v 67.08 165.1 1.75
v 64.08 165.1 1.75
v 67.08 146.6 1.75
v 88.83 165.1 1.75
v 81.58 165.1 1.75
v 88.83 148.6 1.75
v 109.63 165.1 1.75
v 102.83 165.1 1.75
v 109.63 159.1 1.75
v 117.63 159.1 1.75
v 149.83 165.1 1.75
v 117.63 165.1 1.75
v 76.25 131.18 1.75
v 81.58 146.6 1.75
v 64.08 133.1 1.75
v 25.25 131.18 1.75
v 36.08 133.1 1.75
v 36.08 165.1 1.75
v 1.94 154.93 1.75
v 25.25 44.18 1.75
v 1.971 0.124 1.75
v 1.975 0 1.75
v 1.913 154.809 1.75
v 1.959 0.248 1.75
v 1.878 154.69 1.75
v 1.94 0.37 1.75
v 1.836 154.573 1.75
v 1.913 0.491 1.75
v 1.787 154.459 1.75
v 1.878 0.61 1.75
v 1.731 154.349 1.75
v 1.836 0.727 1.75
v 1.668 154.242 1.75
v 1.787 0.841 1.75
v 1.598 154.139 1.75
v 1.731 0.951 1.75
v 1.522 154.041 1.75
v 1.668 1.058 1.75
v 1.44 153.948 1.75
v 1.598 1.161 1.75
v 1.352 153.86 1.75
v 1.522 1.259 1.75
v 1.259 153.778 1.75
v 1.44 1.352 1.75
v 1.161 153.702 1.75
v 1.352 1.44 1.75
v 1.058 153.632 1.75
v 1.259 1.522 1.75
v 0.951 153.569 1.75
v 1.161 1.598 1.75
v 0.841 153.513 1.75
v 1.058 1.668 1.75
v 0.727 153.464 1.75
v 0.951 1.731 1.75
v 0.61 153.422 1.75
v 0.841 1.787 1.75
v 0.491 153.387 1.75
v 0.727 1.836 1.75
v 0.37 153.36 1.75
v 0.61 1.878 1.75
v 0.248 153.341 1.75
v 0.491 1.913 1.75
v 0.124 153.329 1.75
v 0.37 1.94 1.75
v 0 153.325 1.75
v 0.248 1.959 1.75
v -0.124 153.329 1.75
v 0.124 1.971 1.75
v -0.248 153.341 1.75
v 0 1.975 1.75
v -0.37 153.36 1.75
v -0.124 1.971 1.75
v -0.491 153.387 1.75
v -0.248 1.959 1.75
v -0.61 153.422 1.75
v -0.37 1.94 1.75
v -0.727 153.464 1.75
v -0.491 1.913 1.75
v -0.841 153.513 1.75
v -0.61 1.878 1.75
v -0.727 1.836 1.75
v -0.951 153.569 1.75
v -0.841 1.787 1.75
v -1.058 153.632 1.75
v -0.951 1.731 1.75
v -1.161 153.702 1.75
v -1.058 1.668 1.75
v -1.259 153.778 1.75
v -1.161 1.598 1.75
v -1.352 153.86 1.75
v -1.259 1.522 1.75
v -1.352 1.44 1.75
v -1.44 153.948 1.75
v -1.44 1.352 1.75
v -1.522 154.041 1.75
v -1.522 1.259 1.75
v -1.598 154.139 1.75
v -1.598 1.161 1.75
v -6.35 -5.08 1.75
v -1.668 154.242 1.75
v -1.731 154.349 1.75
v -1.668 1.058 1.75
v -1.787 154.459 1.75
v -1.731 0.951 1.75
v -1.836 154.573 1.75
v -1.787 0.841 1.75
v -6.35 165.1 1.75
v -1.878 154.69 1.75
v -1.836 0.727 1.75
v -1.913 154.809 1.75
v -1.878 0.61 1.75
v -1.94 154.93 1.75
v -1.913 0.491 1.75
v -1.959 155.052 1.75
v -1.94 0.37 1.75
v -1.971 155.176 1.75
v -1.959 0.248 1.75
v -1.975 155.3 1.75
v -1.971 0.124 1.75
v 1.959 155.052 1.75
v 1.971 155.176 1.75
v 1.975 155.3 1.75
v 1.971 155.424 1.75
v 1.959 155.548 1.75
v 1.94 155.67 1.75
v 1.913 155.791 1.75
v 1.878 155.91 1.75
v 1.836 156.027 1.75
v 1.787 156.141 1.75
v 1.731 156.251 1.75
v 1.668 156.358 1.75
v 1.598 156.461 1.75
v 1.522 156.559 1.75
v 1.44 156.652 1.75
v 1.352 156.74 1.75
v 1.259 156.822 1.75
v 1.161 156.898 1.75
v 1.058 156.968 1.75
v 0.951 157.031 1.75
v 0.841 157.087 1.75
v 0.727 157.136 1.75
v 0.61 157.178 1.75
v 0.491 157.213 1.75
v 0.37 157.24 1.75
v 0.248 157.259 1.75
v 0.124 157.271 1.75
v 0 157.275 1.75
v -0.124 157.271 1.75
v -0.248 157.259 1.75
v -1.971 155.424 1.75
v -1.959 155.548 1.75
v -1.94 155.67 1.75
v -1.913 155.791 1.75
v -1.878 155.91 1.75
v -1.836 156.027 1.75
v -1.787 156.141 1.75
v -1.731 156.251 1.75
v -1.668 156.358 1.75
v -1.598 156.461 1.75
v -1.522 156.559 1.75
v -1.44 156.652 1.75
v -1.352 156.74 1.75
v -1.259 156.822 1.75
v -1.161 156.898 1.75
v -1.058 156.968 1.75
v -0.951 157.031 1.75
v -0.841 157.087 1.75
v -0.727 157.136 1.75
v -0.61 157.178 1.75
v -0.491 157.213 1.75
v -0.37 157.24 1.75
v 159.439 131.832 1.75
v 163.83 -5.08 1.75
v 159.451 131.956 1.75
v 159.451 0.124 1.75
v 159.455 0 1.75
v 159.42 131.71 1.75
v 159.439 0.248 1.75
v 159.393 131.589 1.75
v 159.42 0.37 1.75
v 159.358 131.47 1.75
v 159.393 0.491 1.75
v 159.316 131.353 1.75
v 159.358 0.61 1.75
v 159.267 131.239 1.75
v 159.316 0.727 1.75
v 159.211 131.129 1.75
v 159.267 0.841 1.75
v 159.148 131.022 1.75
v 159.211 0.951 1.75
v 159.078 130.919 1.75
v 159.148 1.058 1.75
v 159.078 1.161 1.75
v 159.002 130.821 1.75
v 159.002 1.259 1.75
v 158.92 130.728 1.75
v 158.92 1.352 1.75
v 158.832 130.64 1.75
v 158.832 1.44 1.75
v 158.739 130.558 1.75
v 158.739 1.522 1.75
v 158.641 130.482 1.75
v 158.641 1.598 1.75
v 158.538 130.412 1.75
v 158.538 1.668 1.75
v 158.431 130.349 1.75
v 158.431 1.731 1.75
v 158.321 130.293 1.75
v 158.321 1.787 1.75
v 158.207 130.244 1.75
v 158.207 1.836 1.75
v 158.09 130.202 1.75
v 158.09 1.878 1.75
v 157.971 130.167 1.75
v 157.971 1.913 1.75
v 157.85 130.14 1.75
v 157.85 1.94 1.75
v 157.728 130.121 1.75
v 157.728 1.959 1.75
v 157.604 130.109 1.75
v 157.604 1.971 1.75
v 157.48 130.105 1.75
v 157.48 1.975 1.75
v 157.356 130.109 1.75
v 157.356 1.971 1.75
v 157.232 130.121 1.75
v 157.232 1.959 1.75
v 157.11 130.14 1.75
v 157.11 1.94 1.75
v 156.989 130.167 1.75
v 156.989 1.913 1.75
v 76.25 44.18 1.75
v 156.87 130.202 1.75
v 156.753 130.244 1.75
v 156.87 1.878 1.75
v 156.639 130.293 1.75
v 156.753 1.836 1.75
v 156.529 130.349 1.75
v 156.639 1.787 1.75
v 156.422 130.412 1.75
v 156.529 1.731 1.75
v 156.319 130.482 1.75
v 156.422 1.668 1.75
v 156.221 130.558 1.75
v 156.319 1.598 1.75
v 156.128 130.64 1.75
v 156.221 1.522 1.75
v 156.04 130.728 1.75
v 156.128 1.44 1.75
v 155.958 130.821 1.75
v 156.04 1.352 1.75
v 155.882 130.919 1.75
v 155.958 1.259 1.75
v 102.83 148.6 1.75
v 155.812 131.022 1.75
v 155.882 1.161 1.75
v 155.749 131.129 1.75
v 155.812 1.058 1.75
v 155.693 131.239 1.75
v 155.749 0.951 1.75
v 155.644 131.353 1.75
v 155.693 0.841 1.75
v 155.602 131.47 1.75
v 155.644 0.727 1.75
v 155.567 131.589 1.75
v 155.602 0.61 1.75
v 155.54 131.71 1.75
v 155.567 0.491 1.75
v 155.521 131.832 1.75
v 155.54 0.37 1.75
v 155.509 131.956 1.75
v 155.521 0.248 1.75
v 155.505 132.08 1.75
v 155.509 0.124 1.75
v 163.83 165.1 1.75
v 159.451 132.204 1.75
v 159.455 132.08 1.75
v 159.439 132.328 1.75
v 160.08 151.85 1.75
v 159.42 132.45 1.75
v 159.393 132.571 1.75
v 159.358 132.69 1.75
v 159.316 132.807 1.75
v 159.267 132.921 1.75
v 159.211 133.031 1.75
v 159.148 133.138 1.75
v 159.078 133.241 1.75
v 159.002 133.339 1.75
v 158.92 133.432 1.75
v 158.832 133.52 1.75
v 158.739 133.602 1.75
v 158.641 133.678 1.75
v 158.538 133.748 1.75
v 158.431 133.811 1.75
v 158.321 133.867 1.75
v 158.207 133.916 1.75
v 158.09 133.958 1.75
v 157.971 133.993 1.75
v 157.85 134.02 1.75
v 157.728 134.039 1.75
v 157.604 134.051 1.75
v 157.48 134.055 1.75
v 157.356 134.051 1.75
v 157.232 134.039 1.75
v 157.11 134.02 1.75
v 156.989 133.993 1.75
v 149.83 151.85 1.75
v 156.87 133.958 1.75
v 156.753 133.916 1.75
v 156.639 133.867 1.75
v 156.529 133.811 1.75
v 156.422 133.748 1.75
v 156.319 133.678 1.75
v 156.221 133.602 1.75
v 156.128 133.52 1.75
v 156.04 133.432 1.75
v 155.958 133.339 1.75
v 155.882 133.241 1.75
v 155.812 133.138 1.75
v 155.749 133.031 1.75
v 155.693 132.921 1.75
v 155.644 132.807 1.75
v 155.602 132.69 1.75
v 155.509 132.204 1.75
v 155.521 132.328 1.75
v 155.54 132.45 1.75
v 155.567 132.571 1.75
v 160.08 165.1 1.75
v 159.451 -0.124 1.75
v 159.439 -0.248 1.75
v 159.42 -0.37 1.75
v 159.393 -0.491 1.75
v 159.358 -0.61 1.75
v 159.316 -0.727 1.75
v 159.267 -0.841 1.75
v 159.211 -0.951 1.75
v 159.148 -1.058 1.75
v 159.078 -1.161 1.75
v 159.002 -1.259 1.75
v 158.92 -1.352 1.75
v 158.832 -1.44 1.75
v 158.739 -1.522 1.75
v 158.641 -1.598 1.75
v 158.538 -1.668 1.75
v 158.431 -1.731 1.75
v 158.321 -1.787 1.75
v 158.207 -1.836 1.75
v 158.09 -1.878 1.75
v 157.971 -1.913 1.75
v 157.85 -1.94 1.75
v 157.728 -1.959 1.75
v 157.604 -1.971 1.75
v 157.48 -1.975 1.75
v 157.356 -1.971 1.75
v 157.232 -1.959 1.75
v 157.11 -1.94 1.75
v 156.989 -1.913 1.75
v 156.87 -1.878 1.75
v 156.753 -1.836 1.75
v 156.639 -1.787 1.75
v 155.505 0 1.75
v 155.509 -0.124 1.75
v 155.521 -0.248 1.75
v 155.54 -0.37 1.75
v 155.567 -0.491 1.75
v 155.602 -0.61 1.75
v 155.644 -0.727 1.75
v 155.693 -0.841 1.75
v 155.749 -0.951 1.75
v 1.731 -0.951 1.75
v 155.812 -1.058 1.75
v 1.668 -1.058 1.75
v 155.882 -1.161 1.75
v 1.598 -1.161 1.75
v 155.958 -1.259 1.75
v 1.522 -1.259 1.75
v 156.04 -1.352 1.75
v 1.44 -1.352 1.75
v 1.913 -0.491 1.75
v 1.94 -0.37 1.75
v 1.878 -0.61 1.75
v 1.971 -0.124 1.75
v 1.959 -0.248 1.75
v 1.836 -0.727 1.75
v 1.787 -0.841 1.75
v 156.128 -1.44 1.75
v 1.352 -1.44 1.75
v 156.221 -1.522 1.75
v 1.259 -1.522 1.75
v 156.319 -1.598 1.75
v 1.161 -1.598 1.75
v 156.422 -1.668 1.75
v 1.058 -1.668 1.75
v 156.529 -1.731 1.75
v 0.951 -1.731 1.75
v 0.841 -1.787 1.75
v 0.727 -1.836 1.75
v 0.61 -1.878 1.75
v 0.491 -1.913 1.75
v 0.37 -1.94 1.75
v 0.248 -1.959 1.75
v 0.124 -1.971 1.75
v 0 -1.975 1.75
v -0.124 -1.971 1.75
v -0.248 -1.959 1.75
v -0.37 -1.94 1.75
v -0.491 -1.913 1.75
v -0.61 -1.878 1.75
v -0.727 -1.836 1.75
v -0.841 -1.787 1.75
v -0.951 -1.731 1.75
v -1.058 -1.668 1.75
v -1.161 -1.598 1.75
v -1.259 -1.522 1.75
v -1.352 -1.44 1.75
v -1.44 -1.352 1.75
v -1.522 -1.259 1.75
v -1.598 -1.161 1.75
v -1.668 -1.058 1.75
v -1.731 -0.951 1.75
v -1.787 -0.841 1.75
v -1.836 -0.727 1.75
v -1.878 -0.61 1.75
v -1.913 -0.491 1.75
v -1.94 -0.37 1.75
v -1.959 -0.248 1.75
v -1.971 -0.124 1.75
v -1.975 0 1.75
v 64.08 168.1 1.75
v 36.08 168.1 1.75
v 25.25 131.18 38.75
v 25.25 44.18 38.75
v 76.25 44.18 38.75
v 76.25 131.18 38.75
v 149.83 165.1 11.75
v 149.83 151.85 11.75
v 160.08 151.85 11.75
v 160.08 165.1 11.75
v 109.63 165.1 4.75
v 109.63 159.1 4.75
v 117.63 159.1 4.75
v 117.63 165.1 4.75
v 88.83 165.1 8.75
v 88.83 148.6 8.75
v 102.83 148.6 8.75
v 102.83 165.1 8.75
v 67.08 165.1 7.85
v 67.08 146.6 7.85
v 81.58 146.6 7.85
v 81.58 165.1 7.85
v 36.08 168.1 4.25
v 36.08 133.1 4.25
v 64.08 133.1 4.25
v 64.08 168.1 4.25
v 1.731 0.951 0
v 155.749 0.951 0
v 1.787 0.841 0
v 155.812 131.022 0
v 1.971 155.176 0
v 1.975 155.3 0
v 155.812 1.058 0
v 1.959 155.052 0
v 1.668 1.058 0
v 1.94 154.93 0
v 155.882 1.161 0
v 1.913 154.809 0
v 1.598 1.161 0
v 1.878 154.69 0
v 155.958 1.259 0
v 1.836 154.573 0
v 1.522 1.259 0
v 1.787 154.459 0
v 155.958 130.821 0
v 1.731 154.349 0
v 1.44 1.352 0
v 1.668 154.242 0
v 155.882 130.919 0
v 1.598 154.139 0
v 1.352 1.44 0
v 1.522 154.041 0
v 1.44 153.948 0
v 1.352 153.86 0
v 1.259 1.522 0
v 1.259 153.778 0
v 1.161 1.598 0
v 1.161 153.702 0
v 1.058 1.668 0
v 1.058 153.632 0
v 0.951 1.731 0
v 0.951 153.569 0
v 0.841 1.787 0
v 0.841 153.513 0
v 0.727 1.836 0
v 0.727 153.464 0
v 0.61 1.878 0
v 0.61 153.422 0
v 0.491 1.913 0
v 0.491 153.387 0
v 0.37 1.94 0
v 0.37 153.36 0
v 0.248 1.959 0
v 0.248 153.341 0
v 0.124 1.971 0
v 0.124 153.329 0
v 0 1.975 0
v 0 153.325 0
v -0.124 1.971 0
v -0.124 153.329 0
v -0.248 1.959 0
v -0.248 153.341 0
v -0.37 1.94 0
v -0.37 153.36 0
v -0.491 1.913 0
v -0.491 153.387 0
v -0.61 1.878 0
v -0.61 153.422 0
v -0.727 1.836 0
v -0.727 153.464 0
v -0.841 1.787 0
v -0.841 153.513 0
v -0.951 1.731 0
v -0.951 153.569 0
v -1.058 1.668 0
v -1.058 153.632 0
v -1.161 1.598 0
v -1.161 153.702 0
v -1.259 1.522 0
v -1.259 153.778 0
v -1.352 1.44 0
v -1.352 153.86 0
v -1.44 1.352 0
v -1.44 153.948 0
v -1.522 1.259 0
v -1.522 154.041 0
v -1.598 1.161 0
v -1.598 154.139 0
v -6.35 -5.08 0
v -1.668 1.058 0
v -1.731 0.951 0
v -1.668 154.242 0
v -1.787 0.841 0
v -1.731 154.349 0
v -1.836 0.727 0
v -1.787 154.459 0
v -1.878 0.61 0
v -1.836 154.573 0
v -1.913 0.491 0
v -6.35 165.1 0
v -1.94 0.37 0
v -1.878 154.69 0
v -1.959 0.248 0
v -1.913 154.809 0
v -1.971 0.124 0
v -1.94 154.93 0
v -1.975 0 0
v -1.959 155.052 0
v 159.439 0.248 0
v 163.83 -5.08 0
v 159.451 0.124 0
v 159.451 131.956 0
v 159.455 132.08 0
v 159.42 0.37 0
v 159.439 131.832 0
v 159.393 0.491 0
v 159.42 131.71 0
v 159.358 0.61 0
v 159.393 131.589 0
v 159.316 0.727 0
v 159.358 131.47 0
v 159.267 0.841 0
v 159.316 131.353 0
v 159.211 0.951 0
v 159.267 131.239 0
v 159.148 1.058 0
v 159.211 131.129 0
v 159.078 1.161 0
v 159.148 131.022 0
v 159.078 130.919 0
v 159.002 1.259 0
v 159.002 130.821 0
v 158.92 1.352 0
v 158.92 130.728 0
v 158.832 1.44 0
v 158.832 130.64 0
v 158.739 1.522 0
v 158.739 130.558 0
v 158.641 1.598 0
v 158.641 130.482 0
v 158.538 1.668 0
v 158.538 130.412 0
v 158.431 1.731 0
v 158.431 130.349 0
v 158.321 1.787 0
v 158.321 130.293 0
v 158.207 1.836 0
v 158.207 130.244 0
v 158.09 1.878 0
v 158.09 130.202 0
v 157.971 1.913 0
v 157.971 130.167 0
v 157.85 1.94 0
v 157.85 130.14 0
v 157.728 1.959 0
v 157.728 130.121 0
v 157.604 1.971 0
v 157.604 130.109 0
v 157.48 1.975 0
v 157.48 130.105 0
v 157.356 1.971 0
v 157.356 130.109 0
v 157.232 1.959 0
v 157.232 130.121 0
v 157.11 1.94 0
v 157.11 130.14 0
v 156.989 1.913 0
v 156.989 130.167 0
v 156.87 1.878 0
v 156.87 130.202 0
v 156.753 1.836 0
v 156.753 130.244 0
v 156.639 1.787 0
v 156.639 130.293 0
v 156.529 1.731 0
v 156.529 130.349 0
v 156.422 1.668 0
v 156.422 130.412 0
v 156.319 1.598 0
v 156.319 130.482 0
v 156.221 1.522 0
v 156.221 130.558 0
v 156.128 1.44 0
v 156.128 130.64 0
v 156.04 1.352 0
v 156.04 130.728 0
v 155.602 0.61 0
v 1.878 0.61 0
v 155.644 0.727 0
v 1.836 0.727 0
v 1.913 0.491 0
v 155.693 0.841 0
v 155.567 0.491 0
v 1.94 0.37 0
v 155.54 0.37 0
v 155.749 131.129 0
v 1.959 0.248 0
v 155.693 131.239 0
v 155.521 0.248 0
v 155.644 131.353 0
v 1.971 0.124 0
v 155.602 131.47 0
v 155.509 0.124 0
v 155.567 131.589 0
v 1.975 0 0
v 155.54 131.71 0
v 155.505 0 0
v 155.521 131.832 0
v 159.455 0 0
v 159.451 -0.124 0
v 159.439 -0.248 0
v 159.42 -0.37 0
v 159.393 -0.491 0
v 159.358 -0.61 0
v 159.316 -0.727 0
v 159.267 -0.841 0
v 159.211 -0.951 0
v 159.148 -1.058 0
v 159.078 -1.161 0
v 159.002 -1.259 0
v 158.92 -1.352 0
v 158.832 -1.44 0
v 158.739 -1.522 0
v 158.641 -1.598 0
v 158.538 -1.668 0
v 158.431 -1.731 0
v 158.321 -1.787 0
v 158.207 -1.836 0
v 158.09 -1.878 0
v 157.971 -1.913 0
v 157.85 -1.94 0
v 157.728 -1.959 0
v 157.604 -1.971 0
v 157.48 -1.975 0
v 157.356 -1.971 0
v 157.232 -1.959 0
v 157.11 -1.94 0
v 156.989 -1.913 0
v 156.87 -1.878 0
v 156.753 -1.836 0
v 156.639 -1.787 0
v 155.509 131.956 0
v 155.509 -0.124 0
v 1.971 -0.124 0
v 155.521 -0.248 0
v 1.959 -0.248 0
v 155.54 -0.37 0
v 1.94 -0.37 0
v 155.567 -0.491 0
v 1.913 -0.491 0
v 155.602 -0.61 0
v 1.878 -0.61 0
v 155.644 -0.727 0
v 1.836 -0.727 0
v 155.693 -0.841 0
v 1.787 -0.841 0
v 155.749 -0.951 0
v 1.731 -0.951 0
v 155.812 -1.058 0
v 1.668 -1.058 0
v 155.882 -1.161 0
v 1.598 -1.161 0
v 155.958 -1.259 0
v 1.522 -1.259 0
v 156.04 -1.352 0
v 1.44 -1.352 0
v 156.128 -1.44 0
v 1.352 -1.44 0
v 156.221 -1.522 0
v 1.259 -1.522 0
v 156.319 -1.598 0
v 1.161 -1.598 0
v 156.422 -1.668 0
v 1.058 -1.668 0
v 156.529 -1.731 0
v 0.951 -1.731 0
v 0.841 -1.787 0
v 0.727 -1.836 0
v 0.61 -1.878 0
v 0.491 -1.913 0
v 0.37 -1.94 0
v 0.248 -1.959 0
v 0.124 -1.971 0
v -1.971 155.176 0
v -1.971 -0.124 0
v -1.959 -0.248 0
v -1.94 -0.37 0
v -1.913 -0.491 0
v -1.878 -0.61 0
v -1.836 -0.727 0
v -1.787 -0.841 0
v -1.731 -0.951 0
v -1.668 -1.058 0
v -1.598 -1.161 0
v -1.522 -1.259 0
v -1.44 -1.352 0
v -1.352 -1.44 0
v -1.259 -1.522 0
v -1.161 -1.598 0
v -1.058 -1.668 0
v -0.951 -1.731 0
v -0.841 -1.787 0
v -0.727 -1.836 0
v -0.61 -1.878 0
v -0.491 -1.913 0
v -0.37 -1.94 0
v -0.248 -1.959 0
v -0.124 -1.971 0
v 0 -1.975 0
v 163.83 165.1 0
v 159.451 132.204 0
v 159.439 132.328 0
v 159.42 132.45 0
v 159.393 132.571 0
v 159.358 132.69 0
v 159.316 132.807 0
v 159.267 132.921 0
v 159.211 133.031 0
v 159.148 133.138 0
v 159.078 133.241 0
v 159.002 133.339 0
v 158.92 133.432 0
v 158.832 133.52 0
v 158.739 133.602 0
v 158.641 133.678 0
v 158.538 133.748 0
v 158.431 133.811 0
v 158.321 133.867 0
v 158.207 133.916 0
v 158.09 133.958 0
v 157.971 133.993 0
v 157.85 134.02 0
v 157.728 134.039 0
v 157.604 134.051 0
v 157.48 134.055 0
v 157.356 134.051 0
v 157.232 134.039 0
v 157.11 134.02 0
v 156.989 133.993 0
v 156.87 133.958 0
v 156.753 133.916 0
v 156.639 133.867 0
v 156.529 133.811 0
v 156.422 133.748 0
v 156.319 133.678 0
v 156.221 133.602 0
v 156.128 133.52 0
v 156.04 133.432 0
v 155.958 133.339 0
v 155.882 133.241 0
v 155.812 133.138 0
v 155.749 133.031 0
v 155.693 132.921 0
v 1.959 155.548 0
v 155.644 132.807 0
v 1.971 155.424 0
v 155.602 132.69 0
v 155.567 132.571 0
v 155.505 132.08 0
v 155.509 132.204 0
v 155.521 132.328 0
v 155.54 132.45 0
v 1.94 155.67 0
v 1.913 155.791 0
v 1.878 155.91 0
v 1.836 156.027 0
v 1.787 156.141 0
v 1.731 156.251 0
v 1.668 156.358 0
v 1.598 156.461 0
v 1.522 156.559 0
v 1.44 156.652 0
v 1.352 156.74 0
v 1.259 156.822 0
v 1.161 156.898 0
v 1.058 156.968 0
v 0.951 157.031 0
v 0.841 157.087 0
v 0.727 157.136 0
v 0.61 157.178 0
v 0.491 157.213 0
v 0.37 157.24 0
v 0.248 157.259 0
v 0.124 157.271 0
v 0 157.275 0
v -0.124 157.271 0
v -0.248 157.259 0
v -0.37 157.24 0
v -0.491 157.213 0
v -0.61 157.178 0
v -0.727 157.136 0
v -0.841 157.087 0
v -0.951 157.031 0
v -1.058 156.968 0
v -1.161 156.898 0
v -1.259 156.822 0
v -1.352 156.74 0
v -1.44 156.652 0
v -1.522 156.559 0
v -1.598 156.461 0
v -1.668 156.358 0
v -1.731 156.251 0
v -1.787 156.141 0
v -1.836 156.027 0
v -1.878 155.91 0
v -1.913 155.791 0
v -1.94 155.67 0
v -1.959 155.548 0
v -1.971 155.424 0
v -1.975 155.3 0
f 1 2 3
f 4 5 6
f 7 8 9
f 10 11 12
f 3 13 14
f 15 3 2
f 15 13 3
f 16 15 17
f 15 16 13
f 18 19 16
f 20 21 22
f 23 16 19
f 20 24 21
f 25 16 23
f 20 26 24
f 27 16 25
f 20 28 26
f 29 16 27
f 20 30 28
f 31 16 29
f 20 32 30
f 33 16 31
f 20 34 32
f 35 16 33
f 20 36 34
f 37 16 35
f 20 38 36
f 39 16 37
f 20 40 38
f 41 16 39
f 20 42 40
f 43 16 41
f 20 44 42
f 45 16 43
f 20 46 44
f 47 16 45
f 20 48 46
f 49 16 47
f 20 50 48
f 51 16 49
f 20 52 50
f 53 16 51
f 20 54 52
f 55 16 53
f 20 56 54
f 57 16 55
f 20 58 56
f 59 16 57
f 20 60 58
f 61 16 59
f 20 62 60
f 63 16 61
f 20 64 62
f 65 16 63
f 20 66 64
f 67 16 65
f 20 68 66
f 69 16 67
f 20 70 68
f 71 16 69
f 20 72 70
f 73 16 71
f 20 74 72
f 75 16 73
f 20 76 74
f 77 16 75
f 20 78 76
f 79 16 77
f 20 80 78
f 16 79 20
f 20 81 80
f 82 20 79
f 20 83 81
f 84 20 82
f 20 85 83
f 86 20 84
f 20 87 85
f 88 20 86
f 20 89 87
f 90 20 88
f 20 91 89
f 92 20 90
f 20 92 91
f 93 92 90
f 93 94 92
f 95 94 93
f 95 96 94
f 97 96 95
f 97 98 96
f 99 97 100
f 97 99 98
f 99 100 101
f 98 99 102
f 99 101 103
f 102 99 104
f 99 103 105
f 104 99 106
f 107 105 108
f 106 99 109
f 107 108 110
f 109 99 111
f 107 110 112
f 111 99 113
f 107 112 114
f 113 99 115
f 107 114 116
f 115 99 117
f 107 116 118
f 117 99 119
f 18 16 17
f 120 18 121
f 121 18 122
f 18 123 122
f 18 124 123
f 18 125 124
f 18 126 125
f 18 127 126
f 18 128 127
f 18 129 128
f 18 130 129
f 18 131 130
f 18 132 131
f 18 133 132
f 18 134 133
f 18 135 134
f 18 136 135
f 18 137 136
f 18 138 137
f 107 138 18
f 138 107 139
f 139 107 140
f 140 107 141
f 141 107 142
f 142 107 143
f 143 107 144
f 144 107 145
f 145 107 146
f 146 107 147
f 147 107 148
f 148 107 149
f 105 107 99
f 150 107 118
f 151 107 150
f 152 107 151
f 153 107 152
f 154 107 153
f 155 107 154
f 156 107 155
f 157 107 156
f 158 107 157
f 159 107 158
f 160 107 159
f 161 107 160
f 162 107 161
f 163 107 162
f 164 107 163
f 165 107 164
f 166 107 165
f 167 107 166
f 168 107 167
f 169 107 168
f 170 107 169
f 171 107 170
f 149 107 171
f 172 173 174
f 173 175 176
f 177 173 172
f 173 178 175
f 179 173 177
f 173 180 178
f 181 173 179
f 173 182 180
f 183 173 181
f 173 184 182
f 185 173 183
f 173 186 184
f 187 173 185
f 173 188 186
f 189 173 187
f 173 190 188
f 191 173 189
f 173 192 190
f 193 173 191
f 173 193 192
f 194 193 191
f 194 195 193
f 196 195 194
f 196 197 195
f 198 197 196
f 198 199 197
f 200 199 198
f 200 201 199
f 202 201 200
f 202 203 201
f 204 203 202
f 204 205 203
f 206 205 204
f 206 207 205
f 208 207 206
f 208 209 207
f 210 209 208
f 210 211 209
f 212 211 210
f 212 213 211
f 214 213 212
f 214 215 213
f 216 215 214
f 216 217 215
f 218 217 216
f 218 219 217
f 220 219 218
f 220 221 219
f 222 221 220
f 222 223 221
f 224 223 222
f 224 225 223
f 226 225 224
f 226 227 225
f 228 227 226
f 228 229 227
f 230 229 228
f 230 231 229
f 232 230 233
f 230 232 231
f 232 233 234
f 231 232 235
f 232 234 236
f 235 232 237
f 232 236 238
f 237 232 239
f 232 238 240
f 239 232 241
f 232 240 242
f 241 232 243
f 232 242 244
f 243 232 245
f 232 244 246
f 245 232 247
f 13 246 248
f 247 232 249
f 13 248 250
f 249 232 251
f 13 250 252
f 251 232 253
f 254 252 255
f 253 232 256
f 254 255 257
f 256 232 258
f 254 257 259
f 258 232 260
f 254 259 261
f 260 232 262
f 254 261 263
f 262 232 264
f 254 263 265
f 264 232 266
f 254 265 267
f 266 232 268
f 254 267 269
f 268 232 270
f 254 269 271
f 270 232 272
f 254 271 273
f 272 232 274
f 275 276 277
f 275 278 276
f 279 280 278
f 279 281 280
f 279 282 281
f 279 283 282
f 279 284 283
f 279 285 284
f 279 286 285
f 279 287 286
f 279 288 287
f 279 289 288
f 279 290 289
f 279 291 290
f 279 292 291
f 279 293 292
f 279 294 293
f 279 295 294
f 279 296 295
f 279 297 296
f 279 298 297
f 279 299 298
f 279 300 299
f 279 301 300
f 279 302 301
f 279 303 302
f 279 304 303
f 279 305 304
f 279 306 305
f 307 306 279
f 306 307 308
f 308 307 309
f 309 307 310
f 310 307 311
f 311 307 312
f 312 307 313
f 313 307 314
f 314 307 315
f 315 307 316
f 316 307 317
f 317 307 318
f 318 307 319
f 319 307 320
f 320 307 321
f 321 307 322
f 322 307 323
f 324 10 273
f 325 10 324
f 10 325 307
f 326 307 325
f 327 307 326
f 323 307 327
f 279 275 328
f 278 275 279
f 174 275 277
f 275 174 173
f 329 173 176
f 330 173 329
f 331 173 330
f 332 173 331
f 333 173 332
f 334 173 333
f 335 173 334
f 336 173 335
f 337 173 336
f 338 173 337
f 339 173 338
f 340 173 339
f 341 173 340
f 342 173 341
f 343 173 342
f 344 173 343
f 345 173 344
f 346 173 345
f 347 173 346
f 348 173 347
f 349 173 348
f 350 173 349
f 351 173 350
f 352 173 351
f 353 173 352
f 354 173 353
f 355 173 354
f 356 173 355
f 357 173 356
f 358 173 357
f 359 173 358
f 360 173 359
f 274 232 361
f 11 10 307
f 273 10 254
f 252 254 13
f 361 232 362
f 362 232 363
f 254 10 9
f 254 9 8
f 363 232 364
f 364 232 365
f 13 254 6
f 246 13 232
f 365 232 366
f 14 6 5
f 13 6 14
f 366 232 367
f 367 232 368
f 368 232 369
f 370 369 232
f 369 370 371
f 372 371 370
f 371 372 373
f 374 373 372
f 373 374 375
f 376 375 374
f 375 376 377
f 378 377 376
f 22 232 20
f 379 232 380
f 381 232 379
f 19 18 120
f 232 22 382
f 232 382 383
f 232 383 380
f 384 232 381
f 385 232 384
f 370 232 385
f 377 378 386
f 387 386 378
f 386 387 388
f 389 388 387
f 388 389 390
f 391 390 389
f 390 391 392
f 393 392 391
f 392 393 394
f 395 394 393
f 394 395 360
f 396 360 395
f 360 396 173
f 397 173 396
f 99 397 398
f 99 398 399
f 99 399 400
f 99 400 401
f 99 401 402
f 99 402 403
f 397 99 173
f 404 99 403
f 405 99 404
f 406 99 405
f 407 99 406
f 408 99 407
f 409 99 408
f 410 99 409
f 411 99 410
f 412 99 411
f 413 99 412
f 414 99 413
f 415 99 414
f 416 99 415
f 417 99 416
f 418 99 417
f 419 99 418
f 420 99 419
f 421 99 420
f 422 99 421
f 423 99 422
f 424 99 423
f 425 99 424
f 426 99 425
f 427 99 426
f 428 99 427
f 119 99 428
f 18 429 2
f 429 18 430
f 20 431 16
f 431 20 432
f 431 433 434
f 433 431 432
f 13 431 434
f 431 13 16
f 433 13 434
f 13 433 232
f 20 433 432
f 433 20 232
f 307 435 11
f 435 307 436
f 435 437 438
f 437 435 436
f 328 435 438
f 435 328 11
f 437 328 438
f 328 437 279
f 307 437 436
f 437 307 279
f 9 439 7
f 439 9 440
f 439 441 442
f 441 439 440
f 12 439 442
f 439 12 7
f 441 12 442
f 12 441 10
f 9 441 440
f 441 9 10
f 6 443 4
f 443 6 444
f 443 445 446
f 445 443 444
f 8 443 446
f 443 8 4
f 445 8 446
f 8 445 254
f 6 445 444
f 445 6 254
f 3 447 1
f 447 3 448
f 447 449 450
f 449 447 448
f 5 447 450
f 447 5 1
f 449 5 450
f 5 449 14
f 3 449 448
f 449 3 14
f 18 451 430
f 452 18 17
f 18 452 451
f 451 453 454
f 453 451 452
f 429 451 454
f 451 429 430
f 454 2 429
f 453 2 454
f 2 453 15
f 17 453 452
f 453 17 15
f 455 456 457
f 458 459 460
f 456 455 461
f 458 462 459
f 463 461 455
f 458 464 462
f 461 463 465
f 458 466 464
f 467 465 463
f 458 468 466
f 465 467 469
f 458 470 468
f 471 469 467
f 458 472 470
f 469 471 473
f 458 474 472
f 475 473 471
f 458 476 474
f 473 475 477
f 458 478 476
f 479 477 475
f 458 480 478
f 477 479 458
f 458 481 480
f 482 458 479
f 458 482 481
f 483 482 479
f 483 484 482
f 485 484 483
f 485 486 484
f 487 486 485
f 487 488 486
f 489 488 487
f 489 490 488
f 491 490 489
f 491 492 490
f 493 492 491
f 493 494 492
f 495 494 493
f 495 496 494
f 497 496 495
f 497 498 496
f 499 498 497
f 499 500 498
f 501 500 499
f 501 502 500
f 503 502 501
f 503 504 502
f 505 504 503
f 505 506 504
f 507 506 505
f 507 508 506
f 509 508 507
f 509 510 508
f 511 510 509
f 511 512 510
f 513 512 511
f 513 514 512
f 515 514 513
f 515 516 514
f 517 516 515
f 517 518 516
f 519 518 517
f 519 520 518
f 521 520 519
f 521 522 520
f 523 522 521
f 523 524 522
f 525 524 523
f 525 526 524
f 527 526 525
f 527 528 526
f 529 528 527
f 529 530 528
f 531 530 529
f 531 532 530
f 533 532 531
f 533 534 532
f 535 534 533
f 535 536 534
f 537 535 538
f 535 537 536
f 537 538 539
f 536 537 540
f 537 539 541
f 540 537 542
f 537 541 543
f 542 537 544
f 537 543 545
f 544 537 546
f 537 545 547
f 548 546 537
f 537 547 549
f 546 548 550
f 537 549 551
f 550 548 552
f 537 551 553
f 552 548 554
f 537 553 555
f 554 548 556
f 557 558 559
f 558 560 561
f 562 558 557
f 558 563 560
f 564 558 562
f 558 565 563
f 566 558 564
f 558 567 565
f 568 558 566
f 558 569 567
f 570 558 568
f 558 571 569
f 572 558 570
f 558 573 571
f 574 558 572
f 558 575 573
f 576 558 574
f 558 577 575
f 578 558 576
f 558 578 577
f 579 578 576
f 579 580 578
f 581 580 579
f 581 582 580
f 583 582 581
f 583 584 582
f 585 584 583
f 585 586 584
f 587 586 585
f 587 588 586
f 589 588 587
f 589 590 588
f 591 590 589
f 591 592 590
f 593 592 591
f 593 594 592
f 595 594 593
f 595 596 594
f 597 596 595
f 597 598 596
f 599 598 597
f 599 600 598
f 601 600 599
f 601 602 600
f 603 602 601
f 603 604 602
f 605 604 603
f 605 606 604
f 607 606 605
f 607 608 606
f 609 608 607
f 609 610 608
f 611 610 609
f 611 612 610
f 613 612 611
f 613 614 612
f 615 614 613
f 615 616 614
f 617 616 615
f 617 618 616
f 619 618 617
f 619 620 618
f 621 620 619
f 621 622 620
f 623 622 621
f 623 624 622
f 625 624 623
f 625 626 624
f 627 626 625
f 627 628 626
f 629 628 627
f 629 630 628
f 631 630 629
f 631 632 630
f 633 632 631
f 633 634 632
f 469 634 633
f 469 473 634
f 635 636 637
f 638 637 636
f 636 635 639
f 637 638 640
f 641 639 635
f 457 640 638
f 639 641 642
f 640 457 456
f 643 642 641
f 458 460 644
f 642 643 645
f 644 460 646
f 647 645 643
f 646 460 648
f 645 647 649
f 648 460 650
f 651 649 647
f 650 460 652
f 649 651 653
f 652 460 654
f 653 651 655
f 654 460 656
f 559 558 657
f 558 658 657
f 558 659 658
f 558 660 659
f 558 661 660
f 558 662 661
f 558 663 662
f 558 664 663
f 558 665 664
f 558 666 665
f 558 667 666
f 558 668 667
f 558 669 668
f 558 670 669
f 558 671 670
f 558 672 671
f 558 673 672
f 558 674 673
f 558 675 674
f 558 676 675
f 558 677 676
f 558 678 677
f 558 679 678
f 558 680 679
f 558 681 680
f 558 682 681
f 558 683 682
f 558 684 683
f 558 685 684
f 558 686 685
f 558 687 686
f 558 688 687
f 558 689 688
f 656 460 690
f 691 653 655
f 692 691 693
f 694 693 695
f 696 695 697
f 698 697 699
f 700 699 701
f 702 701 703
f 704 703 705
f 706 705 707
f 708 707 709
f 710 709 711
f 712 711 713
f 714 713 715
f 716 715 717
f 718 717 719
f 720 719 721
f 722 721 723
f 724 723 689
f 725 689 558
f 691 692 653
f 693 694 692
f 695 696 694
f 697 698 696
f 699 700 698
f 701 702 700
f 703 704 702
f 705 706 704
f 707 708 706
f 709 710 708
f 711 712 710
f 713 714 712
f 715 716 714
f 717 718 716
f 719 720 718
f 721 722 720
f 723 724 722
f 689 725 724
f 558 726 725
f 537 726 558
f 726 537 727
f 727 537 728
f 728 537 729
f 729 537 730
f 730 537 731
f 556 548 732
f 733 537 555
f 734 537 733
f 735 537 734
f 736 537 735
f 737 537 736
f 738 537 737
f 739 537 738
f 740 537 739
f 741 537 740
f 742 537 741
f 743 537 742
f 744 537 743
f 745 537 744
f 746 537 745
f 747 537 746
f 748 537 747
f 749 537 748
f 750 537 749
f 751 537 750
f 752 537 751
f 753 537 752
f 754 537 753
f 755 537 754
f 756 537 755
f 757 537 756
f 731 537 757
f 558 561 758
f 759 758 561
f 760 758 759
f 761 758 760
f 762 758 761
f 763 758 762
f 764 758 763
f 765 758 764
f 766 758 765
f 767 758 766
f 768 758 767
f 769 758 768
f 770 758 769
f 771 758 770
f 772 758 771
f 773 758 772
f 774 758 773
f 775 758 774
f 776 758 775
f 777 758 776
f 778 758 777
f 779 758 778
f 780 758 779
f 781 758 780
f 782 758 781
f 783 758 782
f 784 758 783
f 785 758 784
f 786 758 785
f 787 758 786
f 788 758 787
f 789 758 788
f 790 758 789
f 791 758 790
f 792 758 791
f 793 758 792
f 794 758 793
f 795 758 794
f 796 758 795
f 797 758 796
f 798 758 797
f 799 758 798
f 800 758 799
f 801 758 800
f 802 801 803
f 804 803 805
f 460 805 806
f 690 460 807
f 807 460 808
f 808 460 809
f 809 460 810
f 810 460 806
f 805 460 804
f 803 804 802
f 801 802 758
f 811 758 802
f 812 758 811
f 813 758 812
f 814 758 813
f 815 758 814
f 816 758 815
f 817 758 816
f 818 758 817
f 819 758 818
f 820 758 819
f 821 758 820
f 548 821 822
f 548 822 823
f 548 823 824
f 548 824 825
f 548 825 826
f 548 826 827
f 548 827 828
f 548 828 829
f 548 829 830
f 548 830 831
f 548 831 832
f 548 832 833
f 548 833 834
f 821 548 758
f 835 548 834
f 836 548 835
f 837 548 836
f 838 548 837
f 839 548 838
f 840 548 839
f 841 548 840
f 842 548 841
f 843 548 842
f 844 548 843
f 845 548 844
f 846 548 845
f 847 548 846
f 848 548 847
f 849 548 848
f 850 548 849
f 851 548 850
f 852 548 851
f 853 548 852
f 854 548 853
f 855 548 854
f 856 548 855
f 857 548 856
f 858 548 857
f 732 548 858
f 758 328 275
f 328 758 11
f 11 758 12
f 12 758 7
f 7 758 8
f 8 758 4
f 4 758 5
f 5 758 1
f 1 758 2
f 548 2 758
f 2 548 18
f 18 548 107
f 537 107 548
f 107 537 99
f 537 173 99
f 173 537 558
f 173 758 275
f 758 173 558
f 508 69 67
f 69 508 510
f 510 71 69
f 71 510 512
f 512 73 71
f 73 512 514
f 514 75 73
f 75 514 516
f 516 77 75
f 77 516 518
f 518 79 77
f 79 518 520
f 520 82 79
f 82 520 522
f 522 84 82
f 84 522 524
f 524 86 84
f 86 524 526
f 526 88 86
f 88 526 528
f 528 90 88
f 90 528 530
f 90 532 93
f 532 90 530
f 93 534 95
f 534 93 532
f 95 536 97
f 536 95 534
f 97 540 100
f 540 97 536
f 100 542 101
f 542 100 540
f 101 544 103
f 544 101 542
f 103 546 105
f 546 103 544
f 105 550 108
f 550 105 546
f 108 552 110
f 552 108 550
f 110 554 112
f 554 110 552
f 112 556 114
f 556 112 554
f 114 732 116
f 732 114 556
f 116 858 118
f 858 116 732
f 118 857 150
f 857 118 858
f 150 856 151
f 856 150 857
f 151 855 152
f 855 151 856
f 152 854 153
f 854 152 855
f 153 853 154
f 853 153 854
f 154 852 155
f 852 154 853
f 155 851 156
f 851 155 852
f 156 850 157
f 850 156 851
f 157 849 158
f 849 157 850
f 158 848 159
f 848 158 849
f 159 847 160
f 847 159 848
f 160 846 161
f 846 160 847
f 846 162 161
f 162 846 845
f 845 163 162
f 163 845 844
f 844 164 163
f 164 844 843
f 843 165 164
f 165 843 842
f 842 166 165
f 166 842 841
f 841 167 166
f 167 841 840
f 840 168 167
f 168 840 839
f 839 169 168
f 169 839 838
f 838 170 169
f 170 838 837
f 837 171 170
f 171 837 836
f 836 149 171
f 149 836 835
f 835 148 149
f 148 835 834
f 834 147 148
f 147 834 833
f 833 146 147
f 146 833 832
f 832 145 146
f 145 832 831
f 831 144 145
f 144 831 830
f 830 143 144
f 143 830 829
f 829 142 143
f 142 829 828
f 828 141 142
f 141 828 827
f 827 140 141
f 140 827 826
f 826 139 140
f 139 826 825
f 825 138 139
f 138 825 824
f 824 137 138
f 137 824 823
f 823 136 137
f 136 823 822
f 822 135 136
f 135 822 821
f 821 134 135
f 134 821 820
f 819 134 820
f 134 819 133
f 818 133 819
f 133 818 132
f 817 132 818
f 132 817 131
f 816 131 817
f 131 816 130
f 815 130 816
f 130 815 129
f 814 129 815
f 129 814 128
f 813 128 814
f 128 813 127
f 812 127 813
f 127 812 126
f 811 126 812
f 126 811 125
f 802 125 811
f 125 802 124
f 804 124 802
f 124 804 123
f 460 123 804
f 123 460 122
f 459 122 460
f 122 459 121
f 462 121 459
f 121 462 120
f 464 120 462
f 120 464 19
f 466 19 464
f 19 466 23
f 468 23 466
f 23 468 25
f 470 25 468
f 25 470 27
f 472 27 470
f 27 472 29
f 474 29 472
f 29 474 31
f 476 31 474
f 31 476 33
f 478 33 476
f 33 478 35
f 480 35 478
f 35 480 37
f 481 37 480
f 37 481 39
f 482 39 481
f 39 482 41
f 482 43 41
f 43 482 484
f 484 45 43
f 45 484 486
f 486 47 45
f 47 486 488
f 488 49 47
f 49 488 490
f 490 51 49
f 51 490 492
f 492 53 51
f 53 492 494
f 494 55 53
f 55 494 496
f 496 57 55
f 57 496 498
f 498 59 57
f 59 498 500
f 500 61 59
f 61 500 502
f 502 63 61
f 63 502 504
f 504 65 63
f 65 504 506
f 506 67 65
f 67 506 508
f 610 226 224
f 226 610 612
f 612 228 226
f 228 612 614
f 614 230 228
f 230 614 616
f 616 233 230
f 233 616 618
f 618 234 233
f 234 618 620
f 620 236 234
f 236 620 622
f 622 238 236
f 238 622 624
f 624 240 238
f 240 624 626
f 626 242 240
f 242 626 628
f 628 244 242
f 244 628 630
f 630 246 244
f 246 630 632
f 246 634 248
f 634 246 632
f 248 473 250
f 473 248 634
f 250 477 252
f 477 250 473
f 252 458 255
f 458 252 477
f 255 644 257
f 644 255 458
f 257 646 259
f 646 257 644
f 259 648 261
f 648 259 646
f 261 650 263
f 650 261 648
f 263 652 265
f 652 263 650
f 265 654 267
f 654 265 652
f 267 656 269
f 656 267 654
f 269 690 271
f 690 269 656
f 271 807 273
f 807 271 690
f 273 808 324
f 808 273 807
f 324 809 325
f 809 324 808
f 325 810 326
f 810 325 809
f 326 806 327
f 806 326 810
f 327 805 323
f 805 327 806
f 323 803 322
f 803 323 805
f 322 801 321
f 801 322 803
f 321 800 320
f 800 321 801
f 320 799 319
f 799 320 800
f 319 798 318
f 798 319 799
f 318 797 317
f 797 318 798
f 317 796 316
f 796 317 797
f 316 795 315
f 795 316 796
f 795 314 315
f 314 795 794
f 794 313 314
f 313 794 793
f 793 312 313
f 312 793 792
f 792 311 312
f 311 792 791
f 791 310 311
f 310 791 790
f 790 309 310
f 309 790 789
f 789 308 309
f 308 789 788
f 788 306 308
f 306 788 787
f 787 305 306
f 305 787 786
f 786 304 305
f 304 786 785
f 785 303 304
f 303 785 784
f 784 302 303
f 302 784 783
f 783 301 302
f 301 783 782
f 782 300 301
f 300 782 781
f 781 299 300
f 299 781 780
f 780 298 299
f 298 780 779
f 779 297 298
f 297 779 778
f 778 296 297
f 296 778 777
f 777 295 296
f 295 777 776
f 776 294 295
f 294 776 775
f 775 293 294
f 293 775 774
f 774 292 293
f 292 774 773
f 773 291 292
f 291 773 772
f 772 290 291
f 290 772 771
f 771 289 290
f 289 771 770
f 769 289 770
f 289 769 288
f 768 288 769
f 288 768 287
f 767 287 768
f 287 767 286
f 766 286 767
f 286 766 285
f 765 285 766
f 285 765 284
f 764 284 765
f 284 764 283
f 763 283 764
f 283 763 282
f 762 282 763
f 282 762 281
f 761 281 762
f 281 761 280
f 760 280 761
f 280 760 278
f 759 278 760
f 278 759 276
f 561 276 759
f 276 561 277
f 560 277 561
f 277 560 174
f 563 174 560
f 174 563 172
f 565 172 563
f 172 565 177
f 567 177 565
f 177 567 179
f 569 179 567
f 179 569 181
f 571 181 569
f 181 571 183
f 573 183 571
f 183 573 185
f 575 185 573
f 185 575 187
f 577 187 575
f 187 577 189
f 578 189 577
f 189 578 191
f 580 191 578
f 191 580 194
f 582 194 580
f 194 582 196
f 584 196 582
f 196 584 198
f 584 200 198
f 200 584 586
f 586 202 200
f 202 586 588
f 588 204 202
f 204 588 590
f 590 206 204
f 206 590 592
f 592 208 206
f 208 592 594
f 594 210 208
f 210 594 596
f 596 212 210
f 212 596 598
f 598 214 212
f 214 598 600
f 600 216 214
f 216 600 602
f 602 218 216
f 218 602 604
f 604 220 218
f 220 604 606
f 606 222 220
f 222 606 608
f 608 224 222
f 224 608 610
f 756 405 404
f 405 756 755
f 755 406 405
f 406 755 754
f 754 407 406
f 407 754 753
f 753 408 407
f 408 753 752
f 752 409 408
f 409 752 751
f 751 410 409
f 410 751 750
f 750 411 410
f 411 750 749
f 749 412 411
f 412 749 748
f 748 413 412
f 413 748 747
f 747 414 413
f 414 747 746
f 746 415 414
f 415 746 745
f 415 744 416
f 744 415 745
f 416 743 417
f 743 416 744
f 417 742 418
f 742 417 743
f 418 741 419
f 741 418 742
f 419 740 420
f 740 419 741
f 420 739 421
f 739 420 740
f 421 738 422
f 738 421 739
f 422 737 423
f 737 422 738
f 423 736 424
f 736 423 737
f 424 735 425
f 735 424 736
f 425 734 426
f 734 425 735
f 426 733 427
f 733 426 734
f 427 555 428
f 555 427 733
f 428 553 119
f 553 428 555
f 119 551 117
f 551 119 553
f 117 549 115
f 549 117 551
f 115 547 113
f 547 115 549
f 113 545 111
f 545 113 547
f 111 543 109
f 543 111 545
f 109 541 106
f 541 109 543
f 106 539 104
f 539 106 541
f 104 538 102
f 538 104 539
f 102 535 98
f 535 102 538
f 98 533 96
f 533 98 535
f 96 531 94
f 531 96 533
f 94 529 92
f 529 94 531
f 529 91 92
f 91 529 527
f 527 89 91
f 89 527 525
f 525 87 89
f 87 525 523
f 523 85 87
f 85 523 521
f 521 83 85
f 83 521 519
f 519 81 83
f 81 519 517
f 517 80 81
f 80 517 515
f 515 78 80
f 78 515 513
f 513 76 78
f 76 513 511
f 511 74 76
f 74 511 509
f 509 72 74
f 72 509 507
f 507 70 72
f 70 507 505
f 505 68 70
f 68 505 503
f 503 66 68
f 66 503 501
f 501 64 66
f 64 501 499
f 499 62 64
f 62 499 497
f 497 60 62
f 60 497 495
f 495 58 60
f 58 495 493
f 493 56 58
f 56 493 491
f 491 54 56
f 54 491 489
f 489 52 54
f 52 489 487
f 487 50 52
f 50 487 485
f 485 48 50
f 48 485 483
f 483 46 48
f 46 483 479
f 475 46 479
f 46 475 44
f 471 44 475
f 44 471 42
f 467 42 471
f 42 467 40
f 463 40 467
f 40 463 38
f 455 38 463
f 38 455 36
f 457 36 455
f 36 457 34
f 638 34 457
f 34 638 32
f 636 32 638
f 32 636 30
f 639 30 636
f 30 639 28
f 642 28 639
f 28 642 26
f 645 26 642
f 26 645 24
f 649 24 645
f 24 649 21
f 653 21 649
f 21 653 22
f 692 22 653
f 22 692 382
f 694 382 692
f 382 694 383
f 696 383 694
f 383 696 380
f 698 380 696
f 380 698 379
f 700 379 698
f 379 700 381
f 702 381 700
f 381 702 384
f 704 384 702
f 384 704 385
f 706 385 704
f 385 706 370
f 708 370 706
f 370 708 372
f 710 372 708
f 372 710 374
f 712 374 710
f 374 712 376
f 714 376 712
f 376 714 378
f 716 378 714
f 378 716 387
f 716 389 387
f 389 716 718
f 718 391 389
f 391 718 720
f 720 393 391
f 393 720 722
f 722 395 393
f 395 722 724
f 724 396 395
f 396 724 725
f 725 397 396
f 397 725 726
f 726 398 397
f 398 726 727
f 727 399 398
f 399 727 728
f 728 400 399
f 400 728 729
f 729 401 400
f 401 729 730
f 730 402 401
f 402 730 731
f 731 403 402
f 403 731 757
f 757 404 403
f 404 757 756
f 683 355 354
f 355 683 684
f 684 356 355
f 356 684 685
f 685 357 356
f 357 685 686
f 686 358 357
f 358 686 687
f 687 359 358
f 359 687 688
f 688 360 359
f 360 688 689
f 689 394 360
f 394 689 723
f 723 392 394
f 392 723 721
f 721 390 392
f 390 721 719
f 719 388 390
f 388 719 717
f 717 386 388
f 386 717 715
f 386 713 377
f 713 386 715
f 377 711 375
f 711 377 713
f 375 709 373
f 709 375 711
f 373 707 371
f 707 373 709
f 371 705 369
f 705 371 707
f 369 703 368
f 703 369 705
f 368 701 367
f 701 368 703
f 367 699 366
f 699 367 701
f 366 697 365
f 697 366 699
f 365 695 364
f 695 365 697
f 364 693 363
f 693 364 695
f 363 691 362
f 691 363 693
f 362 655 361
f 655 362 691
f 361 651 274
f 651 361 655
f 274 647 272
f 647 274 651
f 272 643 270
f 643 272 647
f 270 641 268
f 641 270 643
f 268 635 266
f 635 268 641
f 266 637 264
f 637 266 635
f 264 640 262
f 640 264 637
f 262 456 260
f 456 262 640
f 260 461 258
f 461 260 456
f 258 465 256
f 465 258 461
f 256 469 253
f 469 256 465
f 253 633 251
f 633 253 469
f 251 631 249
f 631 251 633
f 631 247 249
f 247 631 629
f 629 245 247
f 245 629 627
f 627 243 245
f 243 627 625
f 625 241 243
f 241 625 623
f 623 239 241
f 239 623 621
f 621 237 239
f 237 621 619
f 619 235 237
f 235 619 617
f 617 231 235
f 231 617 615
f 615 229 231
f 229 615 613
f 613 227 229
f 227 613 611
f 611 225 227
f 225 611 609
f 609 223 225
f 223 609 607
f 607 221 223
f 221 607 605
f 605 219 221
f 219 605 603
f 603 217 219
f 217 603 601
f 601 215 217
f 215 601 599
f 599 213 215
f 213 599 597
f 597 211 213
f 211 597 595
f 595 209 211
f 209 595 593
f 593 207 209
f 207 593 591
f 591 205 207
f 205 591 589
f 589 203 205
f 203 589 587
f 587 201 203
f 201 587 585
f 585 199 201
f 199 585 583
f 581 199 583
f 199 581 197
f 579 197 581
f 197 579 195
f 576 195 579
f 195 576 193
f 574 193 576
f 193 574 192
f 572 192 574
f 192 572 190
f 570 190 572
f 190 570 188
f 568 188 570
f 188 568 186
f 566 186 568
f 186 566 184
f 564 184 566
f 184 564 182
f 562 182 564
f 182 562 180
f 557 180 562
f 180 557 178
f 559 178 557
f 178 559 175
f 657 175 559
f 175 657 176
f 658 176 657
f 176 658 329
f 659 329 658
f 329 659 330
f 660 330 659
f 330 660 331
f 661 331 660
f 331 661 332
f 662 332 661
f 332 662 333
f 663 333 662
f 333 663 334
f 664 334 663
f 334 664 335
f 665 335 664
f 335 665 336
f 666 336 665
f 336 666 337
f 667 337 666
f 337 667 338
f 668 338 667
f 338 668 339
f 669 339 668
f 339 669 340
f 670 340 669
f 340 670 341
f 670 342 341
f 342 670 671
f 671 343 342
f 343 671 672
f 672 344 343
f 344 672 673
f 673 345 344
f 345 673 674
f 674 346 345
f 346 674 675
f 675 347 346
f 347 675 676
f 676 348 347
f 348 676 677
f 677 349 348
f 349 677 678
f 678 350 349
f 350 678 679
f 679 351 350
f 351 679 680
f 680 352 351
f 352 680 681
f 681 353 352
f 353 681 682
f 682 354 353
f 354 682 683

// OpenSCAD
$fn=100;
module jetsonTX1() {
    color("darkgreen") {  // board
        linear_extrude(1.75) {
            difference() {
                translate([-6.35, -5.08,0]) {
                    square([163.83+6.35, 165.1 +5.08], false);
                }
                circle(d=3.95);
                translate([157.48, 0, 0]) {
                    circle(d=3.95);
                }
                translate([157.48, 132.08, 0]) {
                    circle(d=3.95);
                }
                translate([0, 165.1-9.8,0]) {
                    circle(d=3.95);
                }
            }
        }
    }
    translate([0, 0, 1.75]) { // everything is on top of the board
        color("silver") {  // compute module
            linear_extrude(37) {
                translate([29, 47.68, 0]) {
                    translate([-3.75, -3.5, 0]) {
                        square([51, 87], false);
                    }
                }
            }
        }
        
        color("black") {  // power connector
            translate([163.83-3.75-10.25, 165.1-13.25,0]) {
                linear_extrude(10) {
                    square([10.25,13.25], false);
                }
            }
        }
        
        color("red") { // micro usb port
            translate([163.83-3.75-10.25-32.2-8, 165.1-6,0]) {
                linear_extrude(3) {
                    square([8, 6], false);
                }
            }
        }
        
        color("blue") { // usb a port
            translate([163.83-3.75-10.25-32.2-8-6.8-14, 165.1-16.5, 0]) {
                linear_extrude(7) {
                    square([14, 16.5], false);
                }
            }
        }
        
        color("hotpink") { // hdmi port
            translate([163.83-3.75-10.25-32.2-8-6.8-14-7.25-14.5, 165.1-18.5, 0]) {
                linear_extrude(6.1) {
                    square([14.5, 18.5], false);
                }
            }
        }
        
        color("gold") { // sd card slot
            translate([163.83-3.75-10.25-32.2-8-6.8-14-7.25-14.5-28-3, 165.1-35+3, 0]) {
                linear_extrude(2.5) {
                    square([28, 35], false);
                }
            }
        }
    }
}

jetsonTX1();
